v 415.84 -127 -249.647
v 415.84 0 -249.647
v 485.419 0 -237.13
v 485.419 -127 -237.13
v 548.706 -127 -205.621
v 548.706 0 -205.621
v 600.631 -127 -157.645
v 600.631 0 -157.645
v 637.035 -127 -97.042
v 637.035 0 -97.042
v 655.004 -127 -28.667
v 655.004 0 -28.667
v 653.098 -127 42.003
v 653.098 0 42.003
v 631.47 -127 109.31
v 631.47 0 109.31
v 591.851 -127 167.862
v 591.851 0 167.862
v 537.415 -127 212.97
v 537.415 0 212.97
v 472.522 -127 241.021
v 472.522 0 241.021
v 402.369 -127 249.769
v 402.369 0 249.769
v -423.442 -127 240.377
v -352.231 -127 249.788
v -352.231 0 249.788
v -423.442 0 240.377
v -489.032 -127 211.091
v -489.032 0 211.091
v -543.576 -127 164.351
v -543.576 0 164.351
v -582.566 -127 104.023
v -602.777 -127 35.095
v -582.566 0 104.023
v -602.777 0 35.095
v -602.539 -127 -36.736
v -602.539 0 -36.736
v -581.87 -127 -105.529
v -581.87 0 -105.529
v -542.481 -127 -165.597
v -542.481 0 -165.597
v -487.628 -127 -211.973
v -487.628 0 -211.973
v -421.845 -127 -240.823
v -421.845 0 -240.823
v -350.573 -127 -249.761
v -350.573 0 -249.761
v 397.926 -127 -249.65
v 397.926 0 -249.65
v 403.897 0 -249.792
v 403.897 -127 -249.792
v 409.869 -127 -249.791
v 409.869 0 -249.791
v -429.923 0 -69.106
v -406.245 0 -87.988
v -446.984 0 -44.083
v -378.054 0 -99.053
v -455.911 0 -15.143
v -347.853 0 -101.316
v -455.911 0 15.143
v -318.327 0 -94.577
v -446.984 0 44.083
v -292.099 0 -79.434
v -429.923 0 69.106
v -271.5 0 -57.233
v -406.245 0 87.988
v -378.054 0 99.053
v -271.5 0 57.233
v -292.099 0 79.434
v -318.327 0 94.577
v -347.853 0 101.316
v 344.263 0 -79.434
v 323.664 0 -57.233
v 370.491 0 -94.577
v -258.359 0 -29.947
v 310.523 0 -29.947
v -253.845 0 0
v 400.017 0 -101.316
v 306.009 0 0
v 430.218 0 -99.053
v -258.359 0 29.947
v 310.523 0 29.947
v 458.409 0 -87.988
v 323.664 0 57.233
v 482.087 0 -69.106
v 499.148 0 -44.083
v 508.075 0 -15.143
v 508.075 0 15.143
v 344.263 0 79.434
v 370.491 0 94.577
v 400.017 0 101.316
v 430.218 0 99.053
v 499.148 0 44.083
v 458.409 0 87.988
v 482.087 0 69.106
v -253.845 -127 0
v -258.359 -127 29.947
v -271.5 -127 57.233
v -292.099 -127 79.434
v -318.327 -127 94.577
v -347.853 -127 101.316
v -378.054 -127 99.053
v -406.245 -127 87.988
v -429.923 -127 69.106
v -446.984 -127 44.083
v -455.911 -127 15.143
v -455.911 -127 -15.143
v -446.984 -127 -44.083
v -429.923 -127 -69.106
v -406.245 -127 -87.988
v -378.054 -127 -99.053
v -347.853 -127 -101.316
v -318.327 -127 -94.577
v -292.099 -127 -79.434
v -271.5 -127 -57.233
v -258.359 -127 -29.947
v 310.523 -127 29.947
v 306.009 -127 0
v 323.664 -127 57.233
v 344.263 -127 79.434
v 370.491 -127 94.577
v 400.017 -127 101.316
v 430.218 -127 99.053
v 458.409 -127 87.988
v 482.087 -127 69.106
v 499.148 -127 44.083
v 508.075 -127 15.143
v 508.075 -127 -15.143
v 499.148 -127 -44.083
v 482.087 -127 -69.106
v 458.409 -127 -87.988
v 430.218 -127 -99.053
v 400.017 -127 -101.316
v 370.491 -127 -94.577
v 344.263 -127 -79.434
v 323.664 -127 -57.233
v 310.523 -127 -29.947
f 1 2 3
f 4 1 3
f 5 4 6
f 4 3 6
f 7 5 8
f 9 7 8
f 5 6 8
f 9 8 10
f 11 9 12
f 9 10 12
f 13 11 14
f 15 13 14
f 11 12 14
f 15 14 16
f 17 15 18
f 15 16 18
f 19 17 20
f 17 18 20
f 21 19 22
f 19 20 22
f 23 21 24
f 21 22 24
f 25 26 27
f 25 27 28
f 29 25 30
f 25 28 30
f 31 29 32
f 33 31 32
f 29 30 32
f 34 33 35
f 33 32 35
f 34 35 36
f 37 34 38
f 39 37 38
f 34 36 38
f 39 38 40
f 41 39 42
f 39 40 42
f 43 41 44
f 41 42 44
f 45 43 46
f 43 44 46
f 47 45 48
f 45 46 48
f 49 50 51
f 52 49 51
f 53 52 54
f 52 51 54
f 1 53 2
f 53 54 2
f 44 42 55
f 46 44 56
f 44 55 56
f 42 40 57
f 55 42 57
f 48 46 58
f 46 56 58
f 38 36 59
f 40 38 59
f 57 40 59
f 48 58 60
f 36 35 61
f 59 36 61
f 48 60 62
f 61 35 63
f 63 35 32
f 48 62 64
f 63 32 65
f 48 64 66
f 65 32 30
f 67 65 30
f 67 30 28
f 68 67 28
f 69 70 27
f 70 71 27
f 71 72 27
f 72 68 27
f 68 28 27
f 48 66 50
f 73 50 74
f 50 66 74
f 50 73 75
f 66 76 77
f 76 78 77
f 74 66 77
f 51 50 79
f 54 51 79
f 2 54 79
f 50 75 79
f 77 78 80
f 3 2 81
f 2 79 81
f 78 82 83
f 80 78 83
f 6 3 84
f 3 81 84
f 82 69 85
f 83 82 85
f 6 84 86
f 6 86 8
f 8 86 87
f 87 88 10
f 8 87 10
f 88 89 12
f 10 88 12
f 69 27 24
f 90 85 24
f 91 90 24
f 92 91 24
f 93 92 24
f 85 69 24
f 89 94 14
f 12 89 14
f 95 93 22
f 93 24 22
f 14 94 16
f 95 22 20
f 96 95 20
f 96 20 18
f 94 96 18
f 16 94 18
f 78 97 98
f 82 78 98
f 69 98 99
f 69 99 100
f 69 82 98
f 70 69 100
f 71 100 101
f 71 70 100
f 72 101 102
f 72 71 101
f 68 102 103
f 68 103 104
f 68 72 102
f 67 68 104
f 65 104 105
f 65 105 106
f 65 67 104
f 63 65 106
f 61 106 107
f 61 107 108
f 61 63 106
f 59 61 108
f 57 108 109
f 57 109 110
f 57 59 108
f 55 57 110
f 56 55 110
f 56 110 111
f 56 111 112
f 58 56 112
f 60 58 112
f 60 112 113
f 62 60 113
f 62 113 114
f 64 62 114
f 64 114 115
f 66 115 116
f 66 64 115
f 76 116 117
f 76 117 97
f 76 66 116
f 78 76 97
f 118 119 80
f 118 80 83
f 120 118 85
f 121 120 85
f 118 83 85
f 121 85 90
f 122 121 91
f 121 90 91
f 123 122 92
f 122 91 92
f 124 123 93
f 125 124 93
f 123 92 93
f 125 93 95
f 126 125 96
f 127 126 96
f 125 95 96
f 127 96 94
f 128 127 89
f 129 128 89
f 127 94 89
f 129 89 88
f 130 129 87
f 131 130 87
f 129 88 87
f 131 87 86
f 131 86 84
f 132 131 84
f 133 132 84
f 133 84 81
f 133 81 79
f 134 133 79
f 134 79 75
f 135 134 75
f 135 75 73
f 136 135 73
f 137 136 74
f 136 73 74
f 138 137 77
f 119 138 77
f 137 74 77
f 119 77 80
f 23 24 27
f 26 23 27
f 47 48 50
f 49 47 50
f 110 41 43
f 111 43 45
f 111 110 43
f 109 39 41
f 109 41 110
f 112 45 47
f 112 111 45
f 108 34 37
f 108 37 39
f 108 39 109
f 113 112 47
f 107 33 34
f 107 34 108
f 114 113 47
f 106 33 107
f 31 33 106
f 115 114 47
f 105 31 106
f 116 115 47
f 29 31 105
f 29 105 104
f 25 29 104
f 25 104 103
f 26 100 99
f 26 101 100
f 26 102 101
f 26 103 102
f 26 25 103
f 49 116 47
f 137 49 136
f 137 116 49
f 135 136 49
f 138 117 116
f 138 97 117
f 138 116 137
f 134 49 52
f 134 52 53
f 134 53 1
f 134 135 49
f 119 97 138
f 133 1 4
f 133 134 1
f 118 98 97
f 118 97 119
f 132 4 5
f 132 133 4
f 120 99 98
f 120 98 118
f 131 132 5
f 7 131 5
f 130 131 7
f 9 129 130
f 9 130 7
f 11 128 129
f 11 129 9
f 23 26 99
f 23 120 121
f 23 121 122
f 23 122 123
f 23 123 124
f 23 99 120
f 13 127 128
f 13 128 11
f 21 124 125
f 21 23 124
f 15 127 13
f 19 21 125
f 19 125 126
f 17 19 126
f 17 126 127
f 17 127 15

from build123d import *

# Parameters (mm, degrees)
F0_R     = 101.6
F1_DEPTH = 127


with BuildPart() as f1:
    # F0 (on Front) → F1 (new body)
    with BuildSketch(Plane.XZ):
        with BuildLine():
            ThreePointArc((-350.5727146354, -249.7614733395), (-177.0893178173, -174.9104050294), (-105.6363849792, 0))
            ThreePointArc((-105.6363849792, 0), (-177.6708286975, 175.5014063187), (-352.230732019, 249.7883153539))
            ThreePointArc((-352.230732019, 249.7883153539), (-605.2222561445, 4.0063838927), (-360.2434595529, -249.7629175066))
            Line((-360.2434595529, -249.7629175066), (-350.5727146354, -249.7614733395))
        make_face()
        with Locations((-355.4453849792, 0)):
            Circle(F0_R, mode=Mode.SUBTRACT)
        with BuildLine():
            ThreePointArc((-352.230732019, 249.7883153539), (-177.6708286975, 175.5014063187), (-105.6363849792, 0))
            Line((-105.6363849792, 0), (157.0365696106, 0))
            ThreePointArc((157.0365696106, 0), (228.6283631182, 175.0518888532), (402.3693141559, 249.7688924148))
            Line((402.3693141559, 249.7688924148), (-352.230732019, 249.7883153539))
        make_face()
        with BuildLine():
            Line((157.0365696106, 0), (-105.6363849792, 0))
            ThreePointArc((-105.6363849792, 0), (-177.0893178173, -174.9104050294), (-350.5727146354, -249.7614733395))
            Line((-350.5727146354, -249.7614733395), (397.9256440217, -249.6496973931))
            ThreePointArc((397.9256440217, -249.6496973931), (227.0779221147, -173.4593018399), (157.0365696106, 0))
        make_face()
        with BuildLine():
            ThreePointArc((402.3693141559, 249.7688924148), (228.6283631182, 175.0518888532), (157.0365696106, 0))
            ThreePointArc((157.0365696106, 0), (227.0779221147, -173.4593018399), (397.9256440217, -249.6496973931))
            Line((397.9256440217, -249.6496973931), (415.8400569706, -249.6470221696))
            ThreePointArc((415.8400569706, -249.6470221696), (586.6391184019, -173.4324545581), (656.6545696106, 0))
            ThreePointArc((656.6545696106, 0), (581.8974584638, 178.2172064924), (402.3693141559, 249.7688924148))
        make_face()
        with BuildLine():
            ThreePointArc((509.2094031334, 0), (407.6094031334, -101.6), (306.0094031334, 0))
            ThreePointArc((306.0094031334, 0), (407.6094031334, 101.6), (509.2094031334, 0))
        make_face(mode=Mode.SUBTRACT)
        with BuildLine():
            ThreePointArc((-360.2434595529, -249.7629175066), (-355.4080801051, -249.8089972146), (-350.5727146354, -249.7614733395))
            Line((-350.5727146354, -249.7614733395), (-360.2434595529, -249.7629175066))
        make_face()
        with BuildLine():
            Line((415.8400569706, -249.6470221696), (397.9256440217, -249.6496973931))
            ThreePointArc((397.9256440217, -249.6496973931), (406.8828744847, -249.8089972146), (415.8400569706, -249.6470221696))
        make_face()
    extrude(amount=F1_DEPTH)


solid = f1.part
